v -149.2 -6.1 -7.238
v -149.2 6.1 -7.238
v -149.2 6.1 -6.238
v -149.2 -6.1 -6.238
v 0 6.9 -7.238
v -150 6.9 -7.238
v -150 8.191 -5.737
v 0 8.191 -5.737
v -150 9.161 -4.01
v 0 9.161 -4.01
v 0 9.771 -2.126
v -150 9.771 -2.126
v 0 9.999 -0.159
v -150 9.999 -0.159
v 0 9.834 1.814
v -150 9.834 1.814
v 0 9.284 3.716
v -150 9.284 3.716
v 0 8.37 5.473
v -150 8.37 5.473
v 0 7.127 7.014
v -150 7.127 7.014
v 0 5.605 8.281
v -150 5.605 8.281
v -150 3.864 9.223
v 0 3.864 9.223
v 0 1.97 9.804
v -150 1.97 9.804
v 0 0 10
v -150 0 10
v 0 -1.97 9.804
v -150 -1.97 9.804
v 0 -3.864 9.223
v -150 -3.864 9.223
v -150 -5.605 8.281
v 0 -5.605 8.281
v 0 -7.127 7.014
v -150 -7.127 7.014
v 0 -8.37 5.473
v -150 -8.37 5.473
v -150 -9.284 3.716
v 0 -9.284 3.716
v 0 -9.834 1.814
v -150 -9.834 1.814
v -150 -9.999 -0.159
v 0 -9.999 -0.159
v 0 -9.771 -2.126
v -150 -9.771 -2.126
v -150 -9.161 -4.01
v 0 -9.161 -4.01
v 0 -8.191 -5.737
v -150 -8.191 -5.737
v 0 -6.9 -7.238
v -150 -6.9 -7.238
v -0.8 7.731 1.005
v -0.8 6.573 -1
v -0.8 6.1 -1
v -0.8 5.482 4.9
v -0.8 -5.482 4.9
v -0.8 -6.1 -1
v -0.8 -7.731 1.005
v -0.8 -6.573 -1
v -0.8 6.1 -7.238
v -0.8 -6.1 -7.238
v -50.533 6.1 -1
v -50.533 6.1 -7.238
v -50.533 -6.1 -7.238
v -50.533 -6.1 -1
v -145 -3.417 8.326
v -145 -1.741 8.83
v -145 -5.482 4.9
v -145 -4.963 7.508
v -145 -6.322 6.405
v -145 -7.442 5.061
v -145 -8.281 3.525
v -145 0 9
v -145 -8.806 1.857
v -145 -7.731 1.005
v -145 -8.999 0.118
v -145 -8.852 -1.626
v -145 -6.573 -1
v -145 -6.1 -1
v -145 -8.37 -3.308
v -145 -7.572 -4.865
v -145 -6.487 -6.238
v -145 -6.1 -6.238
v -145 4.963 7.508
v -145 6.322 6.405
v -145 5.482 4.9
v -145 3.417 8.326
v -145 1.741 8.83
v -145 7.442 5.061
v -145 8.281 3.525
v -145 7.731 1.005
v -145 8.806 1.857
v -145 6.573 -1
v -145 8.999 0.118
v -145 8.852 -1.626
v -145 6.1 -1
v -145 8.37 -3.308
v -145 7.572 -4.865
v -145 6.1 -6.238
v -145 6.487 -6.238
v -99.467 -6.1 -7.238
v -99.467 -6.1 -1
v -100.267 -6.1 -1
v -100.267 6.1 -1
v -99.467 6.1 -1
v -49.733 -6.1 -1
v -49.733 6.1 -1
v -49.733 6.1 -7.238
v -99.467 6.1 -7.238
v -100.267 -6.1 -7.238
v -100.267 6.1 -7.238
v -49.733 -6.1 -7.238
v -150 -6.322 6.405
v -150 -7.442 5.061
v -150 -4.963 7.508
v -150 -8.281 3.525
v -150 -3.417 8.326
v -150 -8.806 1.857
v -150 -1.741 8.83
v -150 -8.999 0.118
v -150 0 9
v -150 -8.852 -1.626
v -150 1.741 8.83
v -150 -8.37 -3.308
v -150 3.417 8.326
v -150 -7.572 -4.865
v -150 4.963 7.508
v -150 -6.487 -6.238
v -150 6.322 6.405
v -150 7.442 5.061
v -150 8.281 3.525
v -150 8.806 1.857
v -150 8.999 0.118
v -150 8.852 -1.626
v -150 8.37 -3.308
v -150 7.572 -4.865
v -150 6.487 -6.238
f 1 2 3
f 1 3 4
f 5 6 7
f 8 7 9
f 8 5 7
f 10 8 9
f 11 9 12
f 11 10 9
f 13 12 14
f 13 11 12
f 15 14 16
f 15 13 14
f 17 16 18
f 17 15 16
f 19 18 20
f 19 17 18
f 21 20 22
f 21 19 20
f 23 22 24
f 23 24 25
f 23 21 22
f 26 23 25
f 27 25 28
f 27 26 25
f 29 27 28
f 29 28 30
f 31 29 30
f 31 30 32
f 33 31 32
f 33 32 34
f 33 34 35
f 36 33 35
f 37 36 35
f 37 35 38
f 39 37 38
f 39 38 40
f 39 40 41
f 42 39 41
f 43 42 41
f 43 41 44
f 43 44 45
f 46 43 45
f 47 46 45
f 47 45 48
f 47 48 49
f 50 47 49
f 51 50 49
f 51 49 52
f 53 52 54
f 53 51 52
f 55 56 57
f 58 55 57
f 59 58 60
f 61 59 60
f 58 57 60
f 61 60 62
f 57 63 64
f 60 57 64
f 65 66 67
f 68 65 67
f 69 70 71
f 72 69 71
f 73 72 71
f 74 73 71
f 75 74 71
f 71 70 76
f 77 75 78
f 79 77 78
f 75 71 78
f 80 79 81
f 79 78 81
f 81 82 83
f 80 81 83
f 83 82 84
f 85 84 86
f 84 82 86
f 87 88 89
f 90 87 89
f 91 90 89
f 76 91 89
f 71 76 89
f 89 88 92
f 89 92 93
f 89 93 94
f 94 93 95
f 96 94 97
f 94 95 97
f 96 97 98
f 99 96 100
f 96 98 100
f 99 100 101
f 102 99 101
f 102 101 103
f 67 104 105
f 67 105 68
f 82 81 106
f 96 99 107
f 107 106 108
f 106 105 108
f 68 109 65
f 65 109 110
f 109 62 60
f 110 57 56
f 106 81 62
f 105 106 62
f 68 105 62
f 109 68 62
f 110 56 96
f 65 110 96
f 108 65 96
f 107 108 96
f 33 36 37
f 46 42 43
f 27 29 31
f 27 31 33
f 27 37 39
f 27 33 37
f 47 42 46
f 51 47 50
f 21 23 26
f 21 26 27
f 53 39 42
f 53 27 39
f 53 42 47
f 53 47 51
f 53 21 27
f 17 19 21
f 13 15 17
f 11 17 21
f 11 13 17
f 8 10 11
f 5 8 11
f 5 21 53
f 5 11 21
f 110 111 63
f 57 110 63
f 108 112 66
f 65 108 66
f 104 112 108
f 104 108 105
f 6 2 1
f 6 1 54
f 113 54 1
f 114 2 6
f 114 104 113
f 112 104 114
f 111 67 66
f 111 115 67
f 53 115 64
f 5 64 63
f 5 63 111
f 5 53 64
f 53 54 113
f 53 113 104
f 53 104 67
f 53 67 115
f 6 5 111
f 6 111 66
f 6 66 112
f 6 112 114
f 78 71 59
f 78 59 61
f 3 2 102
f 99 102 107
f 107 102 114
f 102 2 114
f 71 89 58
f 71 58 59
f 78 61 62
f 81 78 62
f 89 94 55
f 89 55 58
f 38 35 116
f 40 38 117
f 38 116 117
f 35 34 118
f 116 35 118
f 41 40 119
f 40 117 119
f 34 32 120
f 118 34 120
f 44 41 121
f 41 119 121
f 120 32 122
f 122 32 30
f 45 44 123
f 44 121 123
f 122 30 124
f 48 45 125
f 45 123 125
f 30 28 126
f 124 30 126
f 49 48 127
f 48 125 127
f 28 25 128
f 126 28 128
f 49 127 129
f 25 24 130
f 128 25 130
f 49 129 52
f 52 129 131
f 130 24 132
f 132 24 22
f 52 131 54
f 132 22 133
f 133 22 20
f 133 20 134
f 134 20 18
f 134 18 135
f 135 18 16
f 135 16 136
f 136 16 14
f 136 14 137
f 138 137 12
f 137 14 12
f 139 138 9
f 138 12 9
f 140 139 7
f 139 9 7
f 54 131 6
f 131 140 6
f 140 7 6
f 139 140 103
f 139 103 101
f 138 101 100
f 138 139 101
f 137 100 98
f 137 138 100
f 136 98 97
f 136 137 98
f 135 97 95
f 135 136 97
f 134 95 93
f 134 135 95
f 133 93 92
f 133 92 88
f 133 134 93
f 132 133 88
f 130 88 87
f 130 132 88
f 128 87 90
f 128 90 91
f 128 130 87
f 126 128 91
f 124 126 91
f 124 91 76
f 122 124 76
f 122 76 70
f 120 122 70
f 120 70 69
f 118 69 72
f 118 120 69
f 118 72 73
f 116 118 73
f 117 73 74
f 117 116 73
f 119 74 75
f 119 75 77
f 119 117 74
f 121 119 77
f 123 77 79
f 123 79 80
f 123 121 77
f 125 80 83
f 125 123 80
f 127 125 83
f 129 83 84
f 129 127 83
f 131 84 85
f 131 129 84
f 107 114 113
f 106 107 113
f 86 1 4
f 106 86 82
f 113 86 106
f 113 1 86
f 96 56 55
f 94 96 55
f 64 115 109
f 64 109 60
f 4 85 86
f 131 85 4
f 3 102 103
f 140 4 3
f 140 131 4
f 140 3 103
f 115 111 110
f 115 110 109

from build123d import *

# Parameters (mm, degrees)
BAR_DEPTH           = 150
CUT_EXTRUDE4_DEPTH  = 5
CUT_EXTRUDE3_REACH  = 19.238
SKETCH6_W           = 48.933333333
SKETCH6_H           = 12.2
SKETCH6_W_2         = 48.933333334
BOSS_EXTRUDE2_DEPTH = 0.8


with BuildPart() as part:
    # Sketch1 → Bar (new body)
    with BuildSketch(Plane(origin=(0, 0, 0), x_dir=(0, 0, -1), z_dir=(1, 0, 0))):
        with BuildLine():
            Line((7.238093672, -6.9), (7.238093672, 6.9))
            ThreePointArc((7.238093672, 6.9), (-10, 0), (7.238093672, -6.9))
        make_face()
        Polygon((1, 6.573205081), (-1.005255888, 7.730940108), (-4.9, 5.482308546), (-4.9, -5.482308546), (-1.005255888, -7.730940108), (1, -6.573205081), align=None, mode=Mode.SUBTRACT)
    extrude(amount=-BAR_DEPTH)

    # Sketch10 → Cut-Extrude4 (cut)
    with BuildSketch(Plane.ZY.offset(150)):
        with BuildLine():
            Line((-6.238093672, -6.487386788), (-6.238093672, 6.487386788))
            ThreePointArc((-6.238093672, 6.487386788), (9, 0), (-6.238093672, -6.487386788))
        make_face()
    extrude(amount=-CUT_EXTRUDE4_DEPTH, mode=Mode.SUBTRACT)

    # Sketch6 → Cut-Extrude3 (cut, up to next)
    with BuildSketch(Plane(origin=(0, 0, -7.238093672), x_dir=(1, 0, 0), z_dir=(0, 0, -1)), mode=Mode.PRIVATE) as cut_extrude3_sk1:
        with Locations((-25.266666667, 0)):
            Rectangle(SKETCH6_W, SKETCH6_H)
    cut_extrude3_tool1 = extrude(cut_extrude3_sk1.sketch, amount=-CUT_EXTRUDE3_REACH, mode=Mode.PRIVATE) & part.part
    add(cut_extrude3_tool1.solids().sort_by_distance((-25.266667, 0, -7.238094))[0], mode=Mode.SUBTRACT)
    # Sketch6 → Cut-Extrude3 (cut, up to next)
    with BuildSketch(Plane(origin=(0, 0, -7.238093672), x_dir=(1, 0, 0), z_dir=(0, 0, -1)), mode=Mode.PRIVATE) as cut_extrude3_sk2:
        with Locations((-75, 0)):
            Rectangle(SKETCH6_W_2, SKETCH6_H)
    cut_extrude3_tool2 = extrude(cut_extrude3_sk2.sketch, amount=-CUT_EXTRUDE3_REACH, mode=Mode.PRIVATE) & part.part
    add(cut_extrude3_tool2.solids().sort_by_distance((-75, 0, -7.238094))[0], mode=Mode.SUBTRACT)
    # Sketch6 → Cut-Extrude3 (cut, up to next)
    with BuildSketch(Plane(origin=(0, 0, -7.238093672), x_dir=(1, 0, 0), z_dir=(0, 0, -1)), mode=Mode.PRIVATE) as cut_extrude3_sk3:
        with Locations((-124.733333334, 0)):
            Rectangle(SKETCH6_W, SKETCH6_H)
    cut_extrude3_tool3 = extrude(cut_extrude3_sk3.sketch, amount=-CUT_EXTRUDE3_REACH, mode=Mode.PRIVATE) & part.part
    add(cut_extrude3_tool3.solids().sort_by_distance((-124.733333, 0, -7.238094))[0], mode=Mode.SUBTRACT)

    # Sketch11 → Boss-Extrude2 (add)
    with BuildSketch(Plane(origin=(0, 0, 0), x_dir=(0, 0, -1), z_dir=(1, 0, 0))):
        with BuildLine():
            Line((7.238093672, -6.9), (7.238093672, 6.9))
            ThreePointArc((7.238093672, 6.9), (-10, 0), (7.238093672, -6.9))
        make_face()
    extrude(amount=-BOSS_EXTRUDE2_DEPTH)


solid = part.part
